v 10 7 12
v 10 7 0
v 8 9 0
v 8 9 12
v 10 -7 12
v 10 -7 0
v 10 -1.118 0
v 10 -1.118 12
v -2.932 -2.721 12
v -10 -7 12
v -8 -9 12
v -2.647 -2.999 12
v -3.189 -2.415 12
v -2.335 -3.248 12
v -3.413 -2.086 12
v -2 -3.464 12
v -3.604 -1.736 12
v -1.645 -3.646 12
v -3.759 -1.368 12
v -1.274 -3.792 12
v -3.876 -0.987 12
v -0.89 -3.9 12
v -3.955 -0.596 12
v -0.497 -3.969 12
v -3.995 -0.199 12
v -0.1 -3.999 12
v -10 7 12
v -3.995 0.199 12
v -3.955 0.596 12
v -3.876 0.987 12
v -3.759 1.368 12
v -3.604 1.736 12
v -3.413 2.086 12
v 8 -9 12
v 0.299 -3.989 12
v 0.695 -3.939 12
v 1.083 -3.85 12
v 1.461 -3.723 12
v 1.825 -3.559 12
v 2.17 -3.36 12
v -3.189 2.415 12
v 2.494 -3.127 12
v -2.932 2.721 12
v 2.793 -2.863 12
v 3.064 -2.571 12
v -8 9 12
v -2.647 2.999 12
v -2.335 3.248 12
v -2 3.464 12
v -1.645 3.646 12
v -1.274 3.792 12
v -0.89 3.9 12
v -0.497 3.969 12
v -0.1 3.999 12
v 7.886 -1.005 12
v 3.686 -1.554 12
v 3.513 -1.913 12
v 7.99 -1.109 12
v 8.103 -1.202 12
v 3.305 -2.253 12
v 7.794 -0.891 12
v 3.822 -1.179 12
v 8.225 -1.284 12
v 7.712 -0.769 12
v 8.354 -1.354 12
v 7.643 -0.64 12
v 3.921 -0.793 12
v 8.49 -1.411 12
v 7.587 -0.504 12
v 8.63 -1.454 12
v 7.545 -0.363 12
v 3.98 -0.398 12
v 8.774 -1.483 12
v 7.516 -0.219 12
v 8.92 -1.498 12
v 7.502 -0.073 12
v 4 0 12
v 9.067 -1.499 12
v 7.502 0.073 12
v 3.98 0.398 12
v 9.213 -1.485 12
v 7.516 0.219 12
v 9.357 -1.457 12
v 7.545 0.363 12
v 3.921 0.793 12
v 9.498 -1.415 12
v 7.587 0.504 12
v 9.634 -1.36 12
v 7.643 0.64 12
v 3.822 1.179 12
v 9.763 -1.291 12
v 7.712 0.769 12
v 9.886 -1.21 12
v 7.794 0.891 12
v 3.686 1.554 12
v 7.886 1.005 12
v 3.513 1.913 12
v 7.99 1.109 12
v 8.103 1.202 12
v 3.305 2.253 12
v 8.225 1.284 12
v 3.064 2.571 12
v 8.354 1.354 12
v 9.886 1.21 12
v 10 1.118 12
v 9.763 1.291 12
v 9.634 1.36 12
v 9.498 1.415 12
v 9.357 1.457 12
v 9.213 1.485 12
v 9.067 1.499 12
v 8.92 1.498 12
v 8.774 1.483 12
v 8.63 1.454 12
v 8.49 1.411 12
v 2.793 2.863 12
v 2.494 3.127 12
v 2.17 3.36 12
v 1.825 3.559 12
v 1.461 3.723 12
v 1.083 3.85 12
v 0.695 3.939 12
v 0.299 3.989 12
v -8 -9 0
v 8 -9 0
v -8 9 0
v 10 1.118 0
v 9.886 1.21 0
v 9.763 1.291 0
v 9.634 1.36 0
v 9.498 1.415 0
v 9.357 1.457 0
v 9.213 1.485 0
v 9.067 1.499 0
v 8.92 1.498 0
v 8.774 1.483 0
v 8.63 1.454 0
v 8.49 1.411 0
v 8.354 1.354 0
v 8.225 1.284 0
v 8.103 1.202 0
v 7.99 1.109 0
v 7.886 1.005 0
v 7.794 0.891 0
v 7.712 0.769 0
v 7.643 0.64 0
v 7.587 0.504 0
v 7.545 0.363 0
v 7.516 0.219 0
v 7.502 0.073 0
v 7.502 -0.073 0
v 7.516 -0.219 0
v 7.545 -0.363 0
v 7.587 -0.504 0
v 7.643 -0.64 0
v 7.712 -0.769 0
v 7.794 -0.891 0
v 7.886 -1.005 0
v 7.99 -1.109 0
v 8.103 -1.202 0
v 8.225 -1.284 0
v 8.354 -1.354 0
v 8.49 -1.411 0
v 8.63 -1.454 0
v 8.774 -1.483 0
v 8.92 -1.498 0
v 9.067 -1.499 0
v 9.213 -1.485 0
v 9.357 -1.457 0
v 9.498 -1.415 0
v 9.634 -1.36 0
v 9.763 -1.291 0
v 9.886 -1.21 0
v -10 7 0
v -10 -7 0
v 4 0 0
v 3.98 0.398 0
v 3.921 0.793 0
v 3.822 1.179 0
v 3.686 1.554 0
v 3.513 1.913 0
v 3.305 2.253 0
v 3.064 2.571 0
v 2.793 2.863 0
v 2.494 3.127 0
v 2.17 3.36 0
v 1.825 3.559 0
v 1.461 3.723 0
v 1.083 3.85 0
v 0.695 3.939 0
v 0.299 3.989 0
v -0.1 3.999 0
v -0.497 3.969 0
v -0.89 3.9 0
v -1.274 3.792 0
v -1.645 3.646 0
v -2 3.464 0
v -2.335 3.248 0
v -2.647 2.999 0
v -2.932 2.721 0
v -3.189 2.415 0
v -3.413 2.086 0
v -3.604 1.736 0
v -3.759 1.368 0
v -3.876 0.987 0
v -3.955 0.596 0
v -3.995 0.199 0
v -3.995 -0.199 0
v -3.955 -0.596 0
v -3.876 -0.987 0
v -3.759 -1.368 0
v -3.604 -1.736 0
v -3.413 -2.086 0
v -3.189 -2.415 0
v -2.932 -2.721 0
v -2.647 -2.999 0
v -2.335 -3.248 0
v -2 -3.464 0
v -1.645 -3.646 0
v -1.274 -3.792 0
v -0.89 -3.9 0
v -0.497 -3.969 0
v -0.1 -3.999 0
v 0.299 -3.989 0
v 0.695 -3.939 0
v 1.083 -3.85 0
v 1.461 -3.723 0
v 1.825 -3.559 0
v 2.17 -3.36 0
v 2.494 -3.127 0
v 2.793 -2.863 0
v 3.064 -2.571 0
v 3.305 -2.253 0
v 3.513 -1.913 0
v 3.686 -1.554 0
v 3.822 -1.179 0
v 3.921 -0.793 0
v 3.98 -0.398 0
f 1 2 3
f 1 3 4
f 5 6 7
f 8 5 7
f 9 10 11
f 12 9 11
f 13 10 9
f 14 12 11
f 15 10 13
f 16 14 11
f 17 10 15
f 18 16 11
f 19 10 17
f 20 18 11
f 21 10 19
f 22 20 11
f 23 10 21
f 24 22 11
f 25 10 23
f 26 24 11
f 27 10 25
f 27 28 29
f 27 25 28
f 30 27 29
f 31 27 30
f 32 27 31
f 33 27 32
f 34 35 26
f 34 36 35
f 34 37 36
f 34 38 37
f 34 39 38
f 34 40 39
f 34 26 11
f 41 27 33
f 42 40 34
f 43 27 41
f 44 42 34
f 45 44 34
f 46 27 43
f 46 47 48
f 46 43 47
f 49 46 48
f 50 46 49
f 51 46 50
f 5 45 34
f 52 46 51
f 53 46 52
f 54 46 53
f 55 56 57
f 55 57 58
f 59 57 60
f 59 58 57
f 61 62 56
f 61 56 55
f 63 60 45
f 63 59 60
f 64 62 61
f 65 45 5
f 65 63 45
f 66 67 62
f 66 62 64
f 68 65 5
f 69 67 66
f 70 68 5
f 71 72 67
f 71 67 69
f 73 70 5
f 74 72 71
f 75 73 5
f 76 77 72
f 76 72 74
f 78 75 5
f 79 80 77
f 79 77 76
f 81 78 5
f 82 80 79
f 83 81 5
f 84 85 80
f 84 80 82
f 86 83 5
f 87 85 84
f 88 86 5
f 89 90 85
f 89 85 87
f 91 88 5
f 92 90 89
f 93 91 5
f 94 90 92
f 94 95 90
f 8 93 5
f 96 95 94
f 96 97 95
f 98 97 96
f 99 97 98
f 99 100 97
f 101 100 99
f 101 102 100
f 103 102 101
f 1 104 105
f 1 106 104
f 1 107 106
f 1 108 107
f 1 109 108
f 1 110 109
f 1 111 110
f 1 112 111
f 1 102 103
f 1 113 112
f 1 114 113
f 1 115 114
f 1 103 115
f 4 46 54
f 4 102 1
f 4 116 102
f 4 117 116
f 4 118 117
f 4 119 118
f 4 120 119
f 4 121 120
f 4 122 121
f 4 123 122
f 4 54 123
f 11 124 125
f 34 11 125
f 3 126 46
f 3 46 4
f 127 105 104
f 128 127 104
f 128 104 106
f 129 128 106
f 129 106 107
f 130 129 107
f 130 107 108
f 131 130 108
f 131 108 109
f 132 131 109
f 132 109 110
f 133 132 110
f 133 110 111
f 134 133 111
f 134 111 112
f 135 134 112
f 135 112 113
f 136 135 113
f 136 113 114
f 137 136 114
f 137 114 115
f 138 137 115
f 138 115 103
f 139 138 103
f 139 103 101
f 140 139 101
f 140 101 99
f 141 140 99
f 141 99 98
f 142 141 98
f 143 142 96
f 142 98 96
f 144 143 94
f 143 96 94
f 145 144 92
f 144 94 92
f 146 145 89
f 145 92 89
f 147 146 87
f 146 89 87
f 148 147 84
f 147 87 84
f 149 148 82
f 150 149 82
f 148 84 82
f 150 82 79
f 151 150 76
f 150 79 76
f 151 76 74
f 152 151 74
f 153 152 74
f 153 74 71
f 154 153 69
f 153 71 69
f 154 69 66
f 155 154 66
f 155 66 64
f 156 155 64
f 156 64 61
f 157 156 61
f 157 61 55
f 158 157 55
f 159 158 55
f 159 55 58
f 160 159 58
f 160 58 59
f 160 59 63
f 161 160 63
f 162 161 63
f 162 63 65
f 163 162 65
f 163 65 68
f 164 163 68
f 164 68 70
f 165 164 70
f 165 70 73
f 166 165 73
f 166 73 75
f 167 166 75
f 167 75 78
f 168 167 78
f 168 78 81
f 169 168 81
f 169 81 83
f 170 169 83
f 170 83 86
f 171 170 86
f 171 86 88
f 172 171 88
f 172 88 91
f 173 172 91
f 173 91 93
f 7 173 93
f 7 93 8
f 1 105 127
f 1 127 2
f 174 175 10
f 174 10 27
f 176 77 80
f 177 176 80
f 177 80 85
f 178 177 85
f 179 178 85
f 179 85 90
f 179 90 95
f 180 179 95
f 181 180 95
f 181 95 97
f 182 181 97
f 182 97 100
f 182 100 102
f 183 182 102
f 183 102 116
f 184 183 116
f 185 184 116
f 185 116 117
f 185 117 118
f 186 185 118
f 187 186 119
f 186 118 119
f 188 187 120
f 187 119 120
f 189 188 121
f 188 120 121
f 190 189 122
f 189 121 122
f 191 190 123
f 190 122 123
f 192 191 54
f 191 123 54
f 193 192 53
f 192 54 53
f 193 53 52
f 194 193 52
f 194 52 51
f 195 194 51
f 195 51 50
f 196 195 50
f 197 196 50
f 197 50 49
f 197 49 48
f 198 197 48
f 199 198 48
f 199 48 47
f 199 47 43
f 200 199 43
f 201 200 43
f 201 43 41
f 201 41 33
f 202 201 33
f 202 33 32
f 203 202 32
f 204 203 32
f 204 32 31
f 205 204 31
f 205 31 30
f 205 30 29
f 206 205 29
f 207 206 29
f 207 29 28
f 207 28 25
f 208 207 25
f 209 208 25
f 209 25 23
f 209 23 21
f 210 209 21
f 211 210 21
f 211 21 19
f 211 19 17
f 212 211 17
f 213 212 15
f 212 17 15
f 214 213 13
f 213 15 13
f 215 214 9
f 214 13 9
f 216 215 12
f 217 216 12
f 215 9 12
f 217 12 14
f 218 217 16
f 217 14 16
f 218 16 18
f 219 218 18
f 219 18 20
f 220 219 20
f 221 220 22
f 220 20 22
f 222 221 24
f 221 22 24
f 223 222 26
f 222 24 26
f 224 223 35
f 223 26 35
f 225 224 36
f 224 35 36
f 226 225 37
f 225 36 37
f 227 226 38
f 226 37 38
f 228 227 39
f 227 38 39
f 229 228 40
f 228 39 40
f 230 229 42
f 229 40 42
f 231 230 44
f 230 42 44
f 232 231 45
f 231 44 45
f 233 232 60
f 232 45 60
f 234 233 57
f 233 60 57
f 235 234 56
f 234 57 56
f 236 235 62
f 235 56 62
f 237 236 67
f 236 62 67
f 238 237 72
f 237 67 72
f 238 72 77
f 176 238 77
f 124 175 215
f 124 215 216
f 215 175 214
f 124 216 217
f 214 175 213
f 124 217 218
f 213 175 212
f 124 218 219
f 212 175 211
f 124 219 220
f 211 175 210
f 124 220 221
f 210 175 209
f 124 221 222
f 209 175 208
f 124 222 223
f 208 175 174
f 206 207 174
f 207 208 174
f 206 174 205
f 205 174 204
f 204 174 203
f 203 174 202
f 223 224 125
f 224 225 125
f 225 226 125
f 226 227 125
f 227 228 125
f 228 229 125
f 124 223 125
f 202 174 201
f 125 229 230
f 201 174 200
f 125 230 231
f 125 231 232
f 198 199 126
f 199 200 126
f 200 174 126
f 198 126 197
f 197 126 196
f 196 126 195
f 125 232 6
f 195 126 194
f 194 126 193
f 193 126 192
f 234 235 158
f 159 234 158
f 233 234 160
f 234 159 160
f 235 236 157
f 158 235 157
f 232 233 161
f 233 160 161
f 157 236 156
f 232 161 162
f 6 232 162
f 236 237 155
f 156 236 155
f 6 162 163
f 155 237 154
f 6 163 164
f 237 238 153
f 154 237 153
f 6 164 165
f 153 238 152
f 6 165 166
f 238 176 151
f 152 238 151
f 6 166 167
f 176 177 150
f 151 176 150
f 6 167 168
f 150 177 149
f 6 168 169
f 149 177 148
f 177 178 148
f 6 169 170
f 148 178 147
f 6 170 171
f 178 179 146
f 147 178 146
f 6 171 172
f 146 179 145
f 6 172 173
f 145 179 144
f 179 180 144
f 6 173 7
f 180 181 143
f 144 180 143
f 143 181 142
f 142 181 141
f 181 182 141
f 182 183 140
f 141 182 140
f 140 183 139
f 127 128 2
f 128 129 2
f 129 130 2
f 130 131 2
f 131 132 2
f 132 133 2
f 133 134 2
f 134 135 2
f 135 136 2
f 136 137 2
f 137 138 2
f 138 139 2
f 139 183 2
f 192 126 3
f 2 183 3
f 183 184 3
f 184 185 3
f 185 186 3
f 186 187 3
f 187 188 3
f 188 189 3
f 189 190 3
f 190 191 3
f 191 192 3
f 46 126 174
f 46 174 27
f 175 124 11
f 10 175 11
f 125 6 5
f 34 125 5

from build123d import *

# Parameters (mm, degrees)
SKETCH1_W           = 20
SKETCH1_H           = 18
BOSS_EXTRUDE1_DEPTH = 12
SKETCH2_R           = 1.5
SKETCH2_R_2         = 4
CUT_EXTRUDE1_DEPTH  = 13
CHAMFER1_SIZE       = 2


with BuildPart() as part:
    # Sketch1 → Boss-Extrude1 (new body)
    with BuildSketch(Plane.XY):
        Rectangle(SKETCH1_W, SKETCH1_H)
    extrude(amount=BOSS_EXTRUDE1_DEPTH)

    # Sketch2 → Cut-Extrude1 (cut, through all)
    with BuildSketch(Plane.XY.offset(12)):
        with Locations((9, 0)):
            Circle(SKETCH2_R)
        Circle(SKETCH2_R_2)
    extrude(amount=-CUT_EXTRUDE1_DEPTH, mode=Mode.SUBTRACT)

    # Chamfer1
    chamfer1_edges = [part.edges().sort_by_distance(p)[0] for p in [
        (10, 9, 6),
        (10, -9, 6),
        (-10, -9, 6),
        (-10, 9, 6),
    ]]
    chamfer(chamfer1_edges, length=CHAMFER1_SIZE)


solid = part.part
